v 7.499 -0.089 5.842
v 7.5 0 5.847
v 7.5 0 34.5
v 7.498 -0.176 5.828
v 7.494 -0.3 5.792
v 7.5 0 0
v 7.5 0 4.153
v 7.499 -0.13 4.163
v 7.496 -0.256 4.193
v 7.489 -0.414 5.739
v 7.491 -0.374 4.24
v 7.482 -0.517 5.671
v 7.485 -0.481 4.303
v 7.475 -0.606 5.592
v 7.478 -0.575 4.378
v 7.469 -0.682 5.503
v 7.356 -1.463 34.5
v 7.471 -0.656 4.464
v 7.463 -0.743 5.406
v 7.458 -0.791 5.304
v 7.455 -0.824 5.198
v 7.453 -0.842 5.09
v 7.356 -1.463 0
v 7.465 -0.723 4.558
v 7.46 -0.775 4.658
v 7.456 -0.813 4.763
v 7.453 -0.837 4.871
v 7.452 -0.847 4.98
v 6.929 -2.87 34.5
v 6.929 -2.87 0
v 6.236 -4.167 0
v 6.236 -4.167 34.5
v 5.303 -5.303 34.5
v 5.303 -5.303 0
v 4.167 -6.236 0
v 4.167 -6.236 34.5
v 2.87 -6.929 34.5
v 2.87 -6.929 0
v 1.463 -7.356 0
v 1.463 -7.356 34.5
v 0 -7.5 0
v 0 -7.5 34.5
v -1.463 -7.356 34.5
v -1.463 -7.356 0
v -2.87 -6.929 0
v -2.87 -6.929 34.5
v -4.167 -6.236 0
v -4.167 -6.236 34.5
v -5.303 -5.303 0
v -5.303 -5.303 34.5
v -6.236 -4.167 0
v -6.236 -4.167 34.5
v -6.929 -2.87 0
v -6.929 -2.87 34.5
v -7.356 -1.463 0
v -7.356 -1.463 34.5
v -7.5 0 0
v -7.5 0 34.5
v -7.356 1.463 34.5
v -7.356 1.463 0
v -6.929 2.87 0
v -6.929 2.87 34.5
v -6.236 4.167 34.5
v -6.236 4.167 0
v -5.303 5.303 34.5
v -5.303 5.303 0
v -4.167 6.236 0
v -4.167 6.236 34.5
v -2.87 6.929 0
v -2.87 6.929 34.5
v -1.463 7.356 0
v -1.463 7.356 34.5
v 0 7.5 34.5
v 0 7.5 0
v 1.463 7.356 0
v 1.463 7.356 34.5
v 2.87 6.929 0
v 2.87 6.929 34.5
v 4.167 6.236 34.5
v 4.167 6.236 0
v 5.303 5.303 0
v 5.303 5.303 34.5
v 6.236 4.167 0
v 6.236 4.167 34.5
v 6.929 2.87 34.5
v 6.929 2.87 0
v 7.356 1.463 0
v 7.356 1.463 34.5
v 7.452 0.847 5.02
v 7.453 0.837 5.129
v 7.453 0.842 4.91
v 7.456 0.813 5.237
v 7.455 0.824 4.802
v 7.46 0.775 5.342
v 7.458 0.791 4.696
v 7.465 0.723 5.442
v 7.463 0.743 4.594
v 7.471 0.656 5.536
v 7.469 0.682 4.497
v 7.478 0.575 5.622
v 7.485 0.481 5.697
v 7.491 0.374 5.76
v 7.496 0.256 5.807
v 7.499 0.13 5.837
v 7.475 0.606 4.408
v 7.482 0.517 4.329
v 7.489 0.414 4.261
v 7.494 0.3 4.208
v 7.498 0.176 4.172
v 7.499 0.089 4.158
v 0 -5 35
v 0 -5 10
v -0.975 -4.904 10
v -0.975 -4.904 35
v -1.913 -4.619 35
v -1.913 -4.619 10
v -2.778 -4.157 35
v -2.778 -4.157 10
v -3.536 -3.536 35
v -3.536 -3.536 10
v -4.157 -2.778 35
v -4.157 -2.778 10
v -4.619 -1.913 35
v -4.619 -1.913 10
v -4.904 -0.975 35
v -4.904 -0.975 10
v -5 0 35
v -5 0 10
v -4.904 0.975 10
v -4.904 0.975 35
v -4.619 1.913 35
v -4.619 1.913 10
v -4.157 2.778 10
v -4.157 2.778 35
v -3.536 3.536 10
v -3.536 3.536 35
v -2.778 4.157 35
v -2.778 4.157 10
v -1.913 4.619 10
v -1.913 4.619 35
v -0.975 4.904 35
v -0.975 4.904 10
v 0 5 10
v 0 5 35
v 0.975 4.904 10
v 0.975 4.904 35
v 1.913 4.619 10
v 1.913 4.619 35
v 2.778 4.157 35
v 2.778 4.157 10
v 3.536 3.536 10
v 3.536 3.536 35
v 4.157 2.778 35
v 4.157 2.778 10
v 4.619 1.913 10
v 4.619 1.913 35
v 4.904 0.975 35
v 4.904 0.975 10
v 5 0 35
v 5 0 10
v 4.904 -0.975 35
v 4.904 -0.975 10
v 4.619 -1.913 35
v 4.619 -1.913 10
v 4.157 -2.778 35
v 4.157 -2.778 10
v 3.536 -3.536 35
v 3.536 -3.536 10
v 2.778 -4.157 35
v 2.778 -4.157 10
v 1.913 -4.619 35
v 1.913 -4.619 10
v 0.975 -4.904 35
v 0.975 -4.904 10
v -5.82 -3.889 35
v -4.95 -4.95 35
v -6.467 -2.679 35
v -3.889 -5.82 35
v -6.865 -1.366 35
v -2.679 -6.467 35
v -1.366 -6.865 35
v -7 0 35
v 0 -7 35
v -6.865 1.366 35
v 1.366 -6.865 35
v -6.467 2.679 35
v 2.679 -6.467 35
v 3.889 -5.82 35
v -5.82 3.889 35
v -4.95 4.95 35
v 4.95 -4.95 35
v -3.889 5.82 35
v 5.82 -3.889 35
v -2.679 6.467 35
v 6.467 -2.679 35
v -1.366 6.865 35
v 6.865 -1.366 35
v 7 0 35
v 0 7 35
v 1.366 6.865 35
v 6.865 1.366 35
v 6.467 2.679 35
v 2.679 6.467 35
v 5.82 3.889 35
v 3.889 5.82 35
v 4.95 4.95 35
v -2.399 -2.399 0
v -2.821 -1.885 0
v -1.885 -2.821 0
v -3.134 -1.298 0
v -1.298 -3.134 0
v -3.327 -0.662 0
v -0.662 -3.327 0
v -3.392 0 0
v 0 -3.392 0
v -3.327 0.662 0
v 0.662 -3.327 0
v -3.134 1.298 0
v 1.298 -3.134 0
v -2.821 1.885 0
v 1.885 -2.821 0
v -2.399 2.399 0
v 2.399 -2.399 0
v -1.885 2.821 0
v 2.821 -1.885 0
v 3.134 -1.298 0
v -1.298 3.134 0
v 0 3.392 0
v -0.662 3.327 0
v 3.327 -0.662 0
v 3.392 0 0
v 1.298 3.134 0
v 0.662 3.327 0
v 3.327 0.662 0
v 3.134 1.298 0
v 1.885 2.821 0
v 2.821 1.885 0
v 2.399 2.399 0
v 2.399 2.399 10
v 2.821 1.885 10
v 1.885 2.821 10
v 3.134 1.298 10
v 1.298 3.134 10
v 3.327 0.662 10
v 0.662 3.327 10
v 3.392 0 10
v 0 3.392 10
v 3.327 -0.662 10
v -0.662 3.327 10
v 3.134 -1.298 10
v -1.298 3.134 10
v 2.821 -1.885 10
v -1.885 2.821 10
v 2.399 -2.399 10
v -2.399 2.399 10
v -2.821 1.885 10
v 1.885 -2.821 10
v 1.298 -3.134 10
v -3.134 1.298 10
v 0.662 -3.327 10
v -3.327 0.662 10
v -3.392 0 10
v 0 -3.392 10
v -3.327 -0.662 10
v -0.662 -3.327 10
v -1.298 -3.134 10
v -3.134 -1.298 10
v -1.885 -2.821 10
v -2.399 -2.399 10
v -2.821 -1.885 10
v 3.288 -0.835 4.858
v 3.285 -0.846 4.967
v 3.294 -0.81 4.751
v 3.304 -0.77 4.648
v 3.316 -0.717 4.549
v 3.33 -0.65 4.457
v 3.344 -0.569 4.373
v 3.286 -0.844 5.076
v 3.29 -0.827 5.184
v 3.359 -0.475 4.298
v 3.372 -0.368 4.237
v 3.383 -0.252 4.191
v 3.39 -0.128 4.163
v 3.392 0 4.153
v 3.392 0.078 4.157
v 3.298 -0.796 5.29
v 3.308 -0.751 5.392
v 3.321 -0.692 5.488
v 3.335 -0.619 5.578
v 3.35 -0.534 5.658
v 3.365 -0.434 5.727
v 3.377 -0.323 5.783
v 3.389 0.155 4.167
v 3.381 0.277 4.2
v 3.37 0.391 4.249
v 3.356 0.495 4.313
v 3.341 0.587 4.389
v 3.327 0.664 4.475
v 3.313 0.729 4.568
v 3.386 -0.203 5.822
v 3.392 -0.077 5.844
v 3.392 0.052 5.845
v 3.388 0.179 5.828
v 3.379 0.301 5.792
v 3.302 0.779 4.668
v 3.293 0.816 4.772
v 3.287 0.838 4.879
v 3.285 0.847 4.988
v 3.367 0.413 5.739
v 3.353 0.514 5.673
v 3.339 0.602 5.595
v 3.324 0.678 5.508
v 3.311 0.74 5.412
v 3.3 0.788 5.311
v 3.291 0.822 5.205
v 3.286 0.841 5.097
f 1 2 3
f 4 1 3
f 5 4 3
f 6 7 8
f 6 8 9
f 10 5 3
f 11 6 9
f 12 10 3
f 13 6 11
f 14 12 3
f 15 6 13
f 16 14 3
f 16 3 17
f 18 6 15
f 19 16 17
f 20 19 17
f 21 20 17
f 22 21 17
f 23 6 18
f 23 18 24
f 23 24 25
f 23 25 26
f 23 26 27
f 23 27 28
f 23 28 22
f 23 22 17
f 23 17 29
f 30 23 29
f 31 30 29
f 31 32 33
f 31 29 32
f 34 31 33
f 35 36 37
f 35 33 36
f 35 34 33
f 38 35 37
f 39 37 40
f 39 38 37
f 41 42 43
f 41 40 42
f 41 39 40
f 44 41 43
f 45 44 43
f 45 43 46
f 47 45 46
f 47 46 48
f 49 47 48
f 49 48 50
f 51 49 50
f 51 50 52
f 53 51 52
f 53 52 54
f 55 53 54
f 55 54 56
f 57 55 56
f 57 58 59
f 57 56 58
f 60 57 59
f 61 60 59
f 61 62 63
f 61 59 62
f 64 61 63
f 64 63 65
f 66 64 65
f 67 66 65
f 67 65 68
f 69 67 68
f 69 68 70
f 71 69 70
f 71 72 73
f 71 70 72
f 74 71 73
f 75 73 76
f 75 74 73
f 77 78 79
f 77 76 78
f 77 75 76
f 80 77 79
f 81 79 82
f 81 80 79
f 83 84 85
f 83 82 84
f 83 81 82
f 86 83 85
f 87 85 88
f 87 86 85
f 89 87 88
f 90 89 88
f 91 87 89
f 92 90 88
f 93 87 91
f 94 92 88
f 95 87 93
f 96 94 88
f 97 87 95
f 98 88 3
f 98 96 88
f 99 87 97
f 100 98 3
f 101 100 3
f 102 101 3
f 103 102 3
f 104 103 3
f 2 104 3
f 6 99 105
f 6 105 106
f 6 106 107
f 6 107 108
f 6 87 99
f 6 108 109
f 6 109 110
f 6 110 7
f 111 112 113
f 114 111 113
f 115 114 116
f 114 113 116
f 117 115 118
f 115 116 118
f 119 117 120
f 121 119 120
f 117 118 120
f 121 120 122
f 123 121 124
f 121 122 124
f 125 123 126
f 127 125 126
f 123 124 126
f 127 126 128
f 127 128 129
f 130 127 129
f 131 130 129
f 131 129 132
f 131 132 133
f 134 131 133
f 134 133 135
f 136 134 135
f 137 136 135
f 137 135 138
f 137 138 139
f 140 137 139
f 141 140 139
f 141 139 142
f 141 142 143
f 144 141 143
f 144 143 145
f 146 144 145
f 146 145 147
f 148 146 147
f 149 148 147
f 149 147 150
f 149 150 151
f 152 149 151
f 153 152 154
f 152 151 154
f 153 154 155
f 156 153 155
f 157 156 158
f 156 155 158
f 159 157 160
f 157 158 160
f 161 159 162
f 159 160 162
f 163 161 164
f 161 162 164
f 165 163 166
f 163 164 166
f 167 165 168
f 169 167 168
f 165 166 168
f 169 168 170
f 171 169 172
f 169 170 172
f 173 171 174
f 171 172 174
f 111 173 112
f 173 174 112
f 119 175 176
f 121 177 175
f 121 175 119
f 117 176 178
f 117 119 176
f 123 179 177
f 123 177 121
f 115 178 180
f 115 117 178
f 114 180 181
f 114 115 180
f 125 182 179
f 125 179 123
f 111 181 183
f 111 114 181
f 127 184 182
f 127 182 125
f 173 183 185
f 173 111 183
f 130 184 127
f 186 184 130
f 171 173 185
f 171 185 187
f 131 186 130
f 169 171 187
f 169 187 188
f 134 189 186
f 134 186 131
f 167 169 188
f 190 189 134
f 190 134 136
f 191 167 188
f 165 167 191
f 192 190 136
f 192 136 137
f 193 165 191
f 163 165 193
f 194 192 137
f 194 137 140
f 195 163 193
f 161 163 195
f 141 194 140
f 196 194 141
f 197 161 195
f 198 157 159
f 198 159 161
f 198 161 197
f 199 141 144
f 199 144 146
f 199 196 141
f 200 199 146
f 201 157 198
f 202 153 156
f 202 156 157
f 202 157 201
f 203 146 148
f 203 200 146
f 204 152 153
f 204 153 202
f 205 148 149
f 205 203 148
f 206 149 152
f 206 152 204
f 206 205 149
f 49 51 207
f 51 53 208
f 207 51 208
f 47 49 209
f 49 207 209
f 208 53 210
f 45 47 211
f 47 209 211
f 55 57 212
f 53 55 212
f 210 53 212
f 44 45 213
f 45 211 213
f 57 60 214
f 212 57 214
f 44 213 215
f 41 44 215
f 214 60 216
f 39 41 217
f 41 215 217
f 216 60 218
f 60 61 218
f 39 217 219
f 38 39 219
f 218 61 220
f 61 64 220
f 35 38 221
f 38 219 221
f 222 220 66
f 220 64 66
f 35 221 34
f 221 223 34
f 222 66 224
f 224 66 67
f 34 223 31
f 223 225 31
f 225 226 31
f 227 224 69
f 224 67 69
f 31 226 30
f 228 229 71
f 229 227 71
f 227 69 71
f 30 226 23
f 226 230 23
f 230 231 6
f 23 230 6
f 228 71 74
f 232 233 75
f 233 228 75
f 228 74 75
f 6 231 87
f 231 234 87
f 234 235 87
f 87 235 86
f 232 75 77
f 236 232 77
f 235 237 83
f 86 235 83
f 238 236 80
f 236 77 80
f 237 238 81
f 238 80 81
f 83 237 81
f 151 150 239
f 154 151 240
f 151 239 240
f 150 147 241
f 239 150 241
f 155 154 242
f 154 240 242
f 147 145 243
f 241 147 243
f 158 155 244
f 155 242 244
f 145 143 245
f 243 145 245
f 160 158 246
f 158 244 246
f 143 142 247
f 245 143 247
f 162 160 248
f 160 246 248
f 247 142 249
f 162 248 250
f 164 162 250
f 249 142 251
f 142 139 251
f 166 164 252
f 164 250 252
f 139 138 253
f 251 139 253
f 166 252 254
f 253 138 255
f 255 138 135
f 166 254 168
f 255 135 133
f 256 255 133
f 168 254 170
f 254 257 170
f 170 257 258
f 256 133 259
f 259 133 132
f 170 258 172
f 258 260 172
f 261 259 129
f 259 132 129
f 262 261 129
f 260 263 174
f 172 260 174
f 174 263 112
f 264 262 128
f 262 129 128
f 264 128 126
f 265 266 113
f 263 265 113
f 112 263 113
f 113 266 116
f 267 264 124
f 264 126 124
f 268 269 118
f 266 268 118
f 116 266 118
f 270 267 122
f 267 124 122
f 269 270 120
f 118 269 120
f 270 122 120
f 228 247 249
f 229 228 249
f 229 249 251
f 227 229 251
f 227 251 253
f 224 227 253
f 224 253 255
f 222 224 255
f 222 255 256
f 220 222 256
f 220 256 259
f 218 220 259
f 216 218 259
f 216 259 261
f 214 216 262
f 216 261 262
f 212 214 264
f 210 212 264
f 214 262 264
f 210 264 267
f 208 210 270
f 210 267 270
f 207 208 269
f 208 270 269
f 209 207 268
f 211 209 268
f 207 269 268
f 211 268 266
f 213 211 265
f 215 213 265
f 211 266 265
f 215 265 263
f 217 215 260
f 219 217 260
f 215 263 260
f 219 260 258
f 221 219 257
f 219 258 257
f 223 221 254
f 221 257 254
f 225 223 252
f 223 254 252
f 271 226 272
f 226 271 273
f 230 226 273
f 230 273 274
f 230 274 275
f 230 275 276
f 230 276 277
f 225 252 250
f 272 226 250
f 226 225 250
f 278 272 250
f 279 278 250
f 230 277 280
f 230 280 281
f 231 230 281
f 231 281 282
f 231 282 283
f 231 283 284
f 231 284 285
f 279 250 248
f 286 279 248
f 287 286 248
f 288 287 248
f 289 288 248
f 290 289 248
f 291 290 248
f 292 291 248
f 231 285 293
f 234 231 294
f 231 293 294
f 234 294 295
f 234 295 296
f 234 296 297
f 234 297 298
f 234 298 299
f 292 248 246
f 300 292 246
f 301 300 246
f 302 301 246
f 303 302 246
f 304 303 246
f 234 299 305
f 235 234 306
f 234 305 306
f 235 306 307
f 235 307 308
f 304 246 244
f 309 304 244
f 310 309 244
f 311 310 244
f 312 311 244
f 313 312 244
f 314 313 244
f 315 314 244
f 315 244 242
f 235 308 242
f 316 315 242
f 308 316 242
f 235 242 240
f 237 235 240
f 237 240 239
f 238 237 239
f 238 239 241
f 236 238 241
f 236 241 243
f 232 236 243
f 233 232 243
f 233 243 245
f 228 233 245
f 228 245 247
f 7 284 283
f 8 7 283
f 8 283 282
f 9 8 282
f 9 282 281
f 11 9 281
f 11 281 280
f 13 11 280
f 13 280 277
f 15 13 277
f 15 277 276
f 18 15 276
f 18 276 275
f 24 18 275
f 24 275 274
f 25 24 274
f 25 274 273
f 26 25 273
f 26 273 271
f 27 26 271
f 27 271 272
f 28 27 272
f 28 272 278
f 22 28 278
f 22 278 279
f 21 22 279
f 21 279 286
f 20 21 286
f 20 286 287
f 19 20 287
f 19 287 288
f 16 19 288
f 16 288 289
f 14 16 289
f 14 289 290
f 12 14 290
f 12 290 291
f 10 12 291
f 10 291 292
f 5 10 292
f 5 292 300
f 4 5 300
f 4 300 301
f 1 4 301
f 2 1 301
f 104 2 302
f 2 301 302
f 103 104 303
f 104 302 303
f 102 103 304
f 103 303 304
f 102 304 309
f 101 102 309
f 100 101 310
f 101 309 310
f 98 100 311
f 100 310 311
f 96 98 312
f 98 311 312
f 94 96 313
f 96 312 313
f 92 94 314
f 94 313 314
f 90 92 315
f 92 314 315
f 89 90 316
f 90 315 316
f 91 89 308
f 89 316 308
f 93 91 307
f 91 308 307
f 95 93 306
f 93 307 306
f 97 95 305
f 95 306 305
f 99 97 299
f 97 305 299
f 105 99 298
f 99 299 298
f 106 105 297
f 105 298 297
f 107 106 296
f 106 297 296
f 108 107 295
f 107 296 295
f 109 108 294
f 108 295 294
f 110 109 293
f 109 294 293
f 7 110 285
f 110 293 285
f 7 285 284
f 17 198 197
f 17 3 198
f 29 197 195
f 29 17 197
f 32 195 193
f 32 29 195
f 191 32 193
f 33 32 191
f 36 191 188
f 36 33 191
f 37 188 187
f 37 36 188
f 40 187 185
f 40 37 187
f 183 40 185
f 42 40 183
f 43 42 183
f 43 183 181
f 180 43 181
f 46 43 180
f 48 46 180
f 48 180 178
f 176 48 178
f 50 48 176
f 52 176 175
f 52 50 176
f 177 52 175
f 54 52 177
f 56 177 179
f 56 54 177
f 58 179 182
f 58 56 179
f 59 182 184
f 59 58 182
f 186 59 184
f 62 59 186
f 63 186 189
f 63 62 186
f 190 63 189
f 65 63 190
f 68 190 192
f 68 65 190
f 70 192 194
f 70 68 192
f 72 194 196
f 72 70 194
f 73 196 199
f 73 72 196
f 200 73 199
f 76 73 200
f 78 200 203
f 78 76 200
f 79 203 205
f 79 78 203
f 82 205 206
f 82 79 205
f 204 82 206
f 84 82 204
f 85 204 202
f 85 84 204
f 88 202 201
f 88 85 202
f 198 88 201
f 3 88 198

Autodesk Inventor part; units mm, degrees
ref_plane "XZ Plane" through (0, 0, 0) normal (0, 1, 0) x (-1, 0, 0)
ref_plane "XY Plane" through (0, 0, 0) normal (0, 0, 1) x (1, 0, 0)
sketch "Sketch1" plane through (0, 0, 0) normal (0, 0, 1) x (1, 0, 0)
  circle A0 centre (0, 0) radius 7.5
  dimension "d0" = 15
extrude "Extrusion1" add sketch "Sketch1" along normal blind 35
hole "Hole1" at (0, 0, 0) direction (0, 0, 1) diameter 6.785 end through all
hole "Hole2" at (0, 0, 35) direction (0, 0, -1) diameter 10 depth 25
chamfer "Chamfer1" distance 0.5 angle 45 1 edges at (-7.5, 0, 35)
ref_plane "Work Plane1" through (7.5, 0, 0) normal (1, 0, 0) x (0, 1, 0)
sketch "Sketch2" plane through (7.5, 0, 0) normal (1, 0, 0) x (0, 1, 0)
  line L0 (-7.5, 0) -> (-7.5, 34.5) projected
  line L1 (-3.3925, 10) -> (-3.3925, 0) projected
  line L2 (3.3925, 10) -> (3.3925, 0) projected
  line L3 (-7.5, 0) -> (7.5, 0) projected
  line L4 (5, 10) -> (-5, 10) projected
  line L5 (0, -7) -> (0, 42) projected
  point P0 (0, 0)
  point P1 (0, 5)
  dimension "d24" = 5
  dimension "d25" = 5
hole "Hole3" at (7.5, 0, 5) direction (-1, 0, 0) diameter 1.694 depth 7.5 thread size "2-56 UNC" class "2B" standard "ANSI Unified Screw Threads"
properties part number "Screw_Asm_Jig_Upper"
